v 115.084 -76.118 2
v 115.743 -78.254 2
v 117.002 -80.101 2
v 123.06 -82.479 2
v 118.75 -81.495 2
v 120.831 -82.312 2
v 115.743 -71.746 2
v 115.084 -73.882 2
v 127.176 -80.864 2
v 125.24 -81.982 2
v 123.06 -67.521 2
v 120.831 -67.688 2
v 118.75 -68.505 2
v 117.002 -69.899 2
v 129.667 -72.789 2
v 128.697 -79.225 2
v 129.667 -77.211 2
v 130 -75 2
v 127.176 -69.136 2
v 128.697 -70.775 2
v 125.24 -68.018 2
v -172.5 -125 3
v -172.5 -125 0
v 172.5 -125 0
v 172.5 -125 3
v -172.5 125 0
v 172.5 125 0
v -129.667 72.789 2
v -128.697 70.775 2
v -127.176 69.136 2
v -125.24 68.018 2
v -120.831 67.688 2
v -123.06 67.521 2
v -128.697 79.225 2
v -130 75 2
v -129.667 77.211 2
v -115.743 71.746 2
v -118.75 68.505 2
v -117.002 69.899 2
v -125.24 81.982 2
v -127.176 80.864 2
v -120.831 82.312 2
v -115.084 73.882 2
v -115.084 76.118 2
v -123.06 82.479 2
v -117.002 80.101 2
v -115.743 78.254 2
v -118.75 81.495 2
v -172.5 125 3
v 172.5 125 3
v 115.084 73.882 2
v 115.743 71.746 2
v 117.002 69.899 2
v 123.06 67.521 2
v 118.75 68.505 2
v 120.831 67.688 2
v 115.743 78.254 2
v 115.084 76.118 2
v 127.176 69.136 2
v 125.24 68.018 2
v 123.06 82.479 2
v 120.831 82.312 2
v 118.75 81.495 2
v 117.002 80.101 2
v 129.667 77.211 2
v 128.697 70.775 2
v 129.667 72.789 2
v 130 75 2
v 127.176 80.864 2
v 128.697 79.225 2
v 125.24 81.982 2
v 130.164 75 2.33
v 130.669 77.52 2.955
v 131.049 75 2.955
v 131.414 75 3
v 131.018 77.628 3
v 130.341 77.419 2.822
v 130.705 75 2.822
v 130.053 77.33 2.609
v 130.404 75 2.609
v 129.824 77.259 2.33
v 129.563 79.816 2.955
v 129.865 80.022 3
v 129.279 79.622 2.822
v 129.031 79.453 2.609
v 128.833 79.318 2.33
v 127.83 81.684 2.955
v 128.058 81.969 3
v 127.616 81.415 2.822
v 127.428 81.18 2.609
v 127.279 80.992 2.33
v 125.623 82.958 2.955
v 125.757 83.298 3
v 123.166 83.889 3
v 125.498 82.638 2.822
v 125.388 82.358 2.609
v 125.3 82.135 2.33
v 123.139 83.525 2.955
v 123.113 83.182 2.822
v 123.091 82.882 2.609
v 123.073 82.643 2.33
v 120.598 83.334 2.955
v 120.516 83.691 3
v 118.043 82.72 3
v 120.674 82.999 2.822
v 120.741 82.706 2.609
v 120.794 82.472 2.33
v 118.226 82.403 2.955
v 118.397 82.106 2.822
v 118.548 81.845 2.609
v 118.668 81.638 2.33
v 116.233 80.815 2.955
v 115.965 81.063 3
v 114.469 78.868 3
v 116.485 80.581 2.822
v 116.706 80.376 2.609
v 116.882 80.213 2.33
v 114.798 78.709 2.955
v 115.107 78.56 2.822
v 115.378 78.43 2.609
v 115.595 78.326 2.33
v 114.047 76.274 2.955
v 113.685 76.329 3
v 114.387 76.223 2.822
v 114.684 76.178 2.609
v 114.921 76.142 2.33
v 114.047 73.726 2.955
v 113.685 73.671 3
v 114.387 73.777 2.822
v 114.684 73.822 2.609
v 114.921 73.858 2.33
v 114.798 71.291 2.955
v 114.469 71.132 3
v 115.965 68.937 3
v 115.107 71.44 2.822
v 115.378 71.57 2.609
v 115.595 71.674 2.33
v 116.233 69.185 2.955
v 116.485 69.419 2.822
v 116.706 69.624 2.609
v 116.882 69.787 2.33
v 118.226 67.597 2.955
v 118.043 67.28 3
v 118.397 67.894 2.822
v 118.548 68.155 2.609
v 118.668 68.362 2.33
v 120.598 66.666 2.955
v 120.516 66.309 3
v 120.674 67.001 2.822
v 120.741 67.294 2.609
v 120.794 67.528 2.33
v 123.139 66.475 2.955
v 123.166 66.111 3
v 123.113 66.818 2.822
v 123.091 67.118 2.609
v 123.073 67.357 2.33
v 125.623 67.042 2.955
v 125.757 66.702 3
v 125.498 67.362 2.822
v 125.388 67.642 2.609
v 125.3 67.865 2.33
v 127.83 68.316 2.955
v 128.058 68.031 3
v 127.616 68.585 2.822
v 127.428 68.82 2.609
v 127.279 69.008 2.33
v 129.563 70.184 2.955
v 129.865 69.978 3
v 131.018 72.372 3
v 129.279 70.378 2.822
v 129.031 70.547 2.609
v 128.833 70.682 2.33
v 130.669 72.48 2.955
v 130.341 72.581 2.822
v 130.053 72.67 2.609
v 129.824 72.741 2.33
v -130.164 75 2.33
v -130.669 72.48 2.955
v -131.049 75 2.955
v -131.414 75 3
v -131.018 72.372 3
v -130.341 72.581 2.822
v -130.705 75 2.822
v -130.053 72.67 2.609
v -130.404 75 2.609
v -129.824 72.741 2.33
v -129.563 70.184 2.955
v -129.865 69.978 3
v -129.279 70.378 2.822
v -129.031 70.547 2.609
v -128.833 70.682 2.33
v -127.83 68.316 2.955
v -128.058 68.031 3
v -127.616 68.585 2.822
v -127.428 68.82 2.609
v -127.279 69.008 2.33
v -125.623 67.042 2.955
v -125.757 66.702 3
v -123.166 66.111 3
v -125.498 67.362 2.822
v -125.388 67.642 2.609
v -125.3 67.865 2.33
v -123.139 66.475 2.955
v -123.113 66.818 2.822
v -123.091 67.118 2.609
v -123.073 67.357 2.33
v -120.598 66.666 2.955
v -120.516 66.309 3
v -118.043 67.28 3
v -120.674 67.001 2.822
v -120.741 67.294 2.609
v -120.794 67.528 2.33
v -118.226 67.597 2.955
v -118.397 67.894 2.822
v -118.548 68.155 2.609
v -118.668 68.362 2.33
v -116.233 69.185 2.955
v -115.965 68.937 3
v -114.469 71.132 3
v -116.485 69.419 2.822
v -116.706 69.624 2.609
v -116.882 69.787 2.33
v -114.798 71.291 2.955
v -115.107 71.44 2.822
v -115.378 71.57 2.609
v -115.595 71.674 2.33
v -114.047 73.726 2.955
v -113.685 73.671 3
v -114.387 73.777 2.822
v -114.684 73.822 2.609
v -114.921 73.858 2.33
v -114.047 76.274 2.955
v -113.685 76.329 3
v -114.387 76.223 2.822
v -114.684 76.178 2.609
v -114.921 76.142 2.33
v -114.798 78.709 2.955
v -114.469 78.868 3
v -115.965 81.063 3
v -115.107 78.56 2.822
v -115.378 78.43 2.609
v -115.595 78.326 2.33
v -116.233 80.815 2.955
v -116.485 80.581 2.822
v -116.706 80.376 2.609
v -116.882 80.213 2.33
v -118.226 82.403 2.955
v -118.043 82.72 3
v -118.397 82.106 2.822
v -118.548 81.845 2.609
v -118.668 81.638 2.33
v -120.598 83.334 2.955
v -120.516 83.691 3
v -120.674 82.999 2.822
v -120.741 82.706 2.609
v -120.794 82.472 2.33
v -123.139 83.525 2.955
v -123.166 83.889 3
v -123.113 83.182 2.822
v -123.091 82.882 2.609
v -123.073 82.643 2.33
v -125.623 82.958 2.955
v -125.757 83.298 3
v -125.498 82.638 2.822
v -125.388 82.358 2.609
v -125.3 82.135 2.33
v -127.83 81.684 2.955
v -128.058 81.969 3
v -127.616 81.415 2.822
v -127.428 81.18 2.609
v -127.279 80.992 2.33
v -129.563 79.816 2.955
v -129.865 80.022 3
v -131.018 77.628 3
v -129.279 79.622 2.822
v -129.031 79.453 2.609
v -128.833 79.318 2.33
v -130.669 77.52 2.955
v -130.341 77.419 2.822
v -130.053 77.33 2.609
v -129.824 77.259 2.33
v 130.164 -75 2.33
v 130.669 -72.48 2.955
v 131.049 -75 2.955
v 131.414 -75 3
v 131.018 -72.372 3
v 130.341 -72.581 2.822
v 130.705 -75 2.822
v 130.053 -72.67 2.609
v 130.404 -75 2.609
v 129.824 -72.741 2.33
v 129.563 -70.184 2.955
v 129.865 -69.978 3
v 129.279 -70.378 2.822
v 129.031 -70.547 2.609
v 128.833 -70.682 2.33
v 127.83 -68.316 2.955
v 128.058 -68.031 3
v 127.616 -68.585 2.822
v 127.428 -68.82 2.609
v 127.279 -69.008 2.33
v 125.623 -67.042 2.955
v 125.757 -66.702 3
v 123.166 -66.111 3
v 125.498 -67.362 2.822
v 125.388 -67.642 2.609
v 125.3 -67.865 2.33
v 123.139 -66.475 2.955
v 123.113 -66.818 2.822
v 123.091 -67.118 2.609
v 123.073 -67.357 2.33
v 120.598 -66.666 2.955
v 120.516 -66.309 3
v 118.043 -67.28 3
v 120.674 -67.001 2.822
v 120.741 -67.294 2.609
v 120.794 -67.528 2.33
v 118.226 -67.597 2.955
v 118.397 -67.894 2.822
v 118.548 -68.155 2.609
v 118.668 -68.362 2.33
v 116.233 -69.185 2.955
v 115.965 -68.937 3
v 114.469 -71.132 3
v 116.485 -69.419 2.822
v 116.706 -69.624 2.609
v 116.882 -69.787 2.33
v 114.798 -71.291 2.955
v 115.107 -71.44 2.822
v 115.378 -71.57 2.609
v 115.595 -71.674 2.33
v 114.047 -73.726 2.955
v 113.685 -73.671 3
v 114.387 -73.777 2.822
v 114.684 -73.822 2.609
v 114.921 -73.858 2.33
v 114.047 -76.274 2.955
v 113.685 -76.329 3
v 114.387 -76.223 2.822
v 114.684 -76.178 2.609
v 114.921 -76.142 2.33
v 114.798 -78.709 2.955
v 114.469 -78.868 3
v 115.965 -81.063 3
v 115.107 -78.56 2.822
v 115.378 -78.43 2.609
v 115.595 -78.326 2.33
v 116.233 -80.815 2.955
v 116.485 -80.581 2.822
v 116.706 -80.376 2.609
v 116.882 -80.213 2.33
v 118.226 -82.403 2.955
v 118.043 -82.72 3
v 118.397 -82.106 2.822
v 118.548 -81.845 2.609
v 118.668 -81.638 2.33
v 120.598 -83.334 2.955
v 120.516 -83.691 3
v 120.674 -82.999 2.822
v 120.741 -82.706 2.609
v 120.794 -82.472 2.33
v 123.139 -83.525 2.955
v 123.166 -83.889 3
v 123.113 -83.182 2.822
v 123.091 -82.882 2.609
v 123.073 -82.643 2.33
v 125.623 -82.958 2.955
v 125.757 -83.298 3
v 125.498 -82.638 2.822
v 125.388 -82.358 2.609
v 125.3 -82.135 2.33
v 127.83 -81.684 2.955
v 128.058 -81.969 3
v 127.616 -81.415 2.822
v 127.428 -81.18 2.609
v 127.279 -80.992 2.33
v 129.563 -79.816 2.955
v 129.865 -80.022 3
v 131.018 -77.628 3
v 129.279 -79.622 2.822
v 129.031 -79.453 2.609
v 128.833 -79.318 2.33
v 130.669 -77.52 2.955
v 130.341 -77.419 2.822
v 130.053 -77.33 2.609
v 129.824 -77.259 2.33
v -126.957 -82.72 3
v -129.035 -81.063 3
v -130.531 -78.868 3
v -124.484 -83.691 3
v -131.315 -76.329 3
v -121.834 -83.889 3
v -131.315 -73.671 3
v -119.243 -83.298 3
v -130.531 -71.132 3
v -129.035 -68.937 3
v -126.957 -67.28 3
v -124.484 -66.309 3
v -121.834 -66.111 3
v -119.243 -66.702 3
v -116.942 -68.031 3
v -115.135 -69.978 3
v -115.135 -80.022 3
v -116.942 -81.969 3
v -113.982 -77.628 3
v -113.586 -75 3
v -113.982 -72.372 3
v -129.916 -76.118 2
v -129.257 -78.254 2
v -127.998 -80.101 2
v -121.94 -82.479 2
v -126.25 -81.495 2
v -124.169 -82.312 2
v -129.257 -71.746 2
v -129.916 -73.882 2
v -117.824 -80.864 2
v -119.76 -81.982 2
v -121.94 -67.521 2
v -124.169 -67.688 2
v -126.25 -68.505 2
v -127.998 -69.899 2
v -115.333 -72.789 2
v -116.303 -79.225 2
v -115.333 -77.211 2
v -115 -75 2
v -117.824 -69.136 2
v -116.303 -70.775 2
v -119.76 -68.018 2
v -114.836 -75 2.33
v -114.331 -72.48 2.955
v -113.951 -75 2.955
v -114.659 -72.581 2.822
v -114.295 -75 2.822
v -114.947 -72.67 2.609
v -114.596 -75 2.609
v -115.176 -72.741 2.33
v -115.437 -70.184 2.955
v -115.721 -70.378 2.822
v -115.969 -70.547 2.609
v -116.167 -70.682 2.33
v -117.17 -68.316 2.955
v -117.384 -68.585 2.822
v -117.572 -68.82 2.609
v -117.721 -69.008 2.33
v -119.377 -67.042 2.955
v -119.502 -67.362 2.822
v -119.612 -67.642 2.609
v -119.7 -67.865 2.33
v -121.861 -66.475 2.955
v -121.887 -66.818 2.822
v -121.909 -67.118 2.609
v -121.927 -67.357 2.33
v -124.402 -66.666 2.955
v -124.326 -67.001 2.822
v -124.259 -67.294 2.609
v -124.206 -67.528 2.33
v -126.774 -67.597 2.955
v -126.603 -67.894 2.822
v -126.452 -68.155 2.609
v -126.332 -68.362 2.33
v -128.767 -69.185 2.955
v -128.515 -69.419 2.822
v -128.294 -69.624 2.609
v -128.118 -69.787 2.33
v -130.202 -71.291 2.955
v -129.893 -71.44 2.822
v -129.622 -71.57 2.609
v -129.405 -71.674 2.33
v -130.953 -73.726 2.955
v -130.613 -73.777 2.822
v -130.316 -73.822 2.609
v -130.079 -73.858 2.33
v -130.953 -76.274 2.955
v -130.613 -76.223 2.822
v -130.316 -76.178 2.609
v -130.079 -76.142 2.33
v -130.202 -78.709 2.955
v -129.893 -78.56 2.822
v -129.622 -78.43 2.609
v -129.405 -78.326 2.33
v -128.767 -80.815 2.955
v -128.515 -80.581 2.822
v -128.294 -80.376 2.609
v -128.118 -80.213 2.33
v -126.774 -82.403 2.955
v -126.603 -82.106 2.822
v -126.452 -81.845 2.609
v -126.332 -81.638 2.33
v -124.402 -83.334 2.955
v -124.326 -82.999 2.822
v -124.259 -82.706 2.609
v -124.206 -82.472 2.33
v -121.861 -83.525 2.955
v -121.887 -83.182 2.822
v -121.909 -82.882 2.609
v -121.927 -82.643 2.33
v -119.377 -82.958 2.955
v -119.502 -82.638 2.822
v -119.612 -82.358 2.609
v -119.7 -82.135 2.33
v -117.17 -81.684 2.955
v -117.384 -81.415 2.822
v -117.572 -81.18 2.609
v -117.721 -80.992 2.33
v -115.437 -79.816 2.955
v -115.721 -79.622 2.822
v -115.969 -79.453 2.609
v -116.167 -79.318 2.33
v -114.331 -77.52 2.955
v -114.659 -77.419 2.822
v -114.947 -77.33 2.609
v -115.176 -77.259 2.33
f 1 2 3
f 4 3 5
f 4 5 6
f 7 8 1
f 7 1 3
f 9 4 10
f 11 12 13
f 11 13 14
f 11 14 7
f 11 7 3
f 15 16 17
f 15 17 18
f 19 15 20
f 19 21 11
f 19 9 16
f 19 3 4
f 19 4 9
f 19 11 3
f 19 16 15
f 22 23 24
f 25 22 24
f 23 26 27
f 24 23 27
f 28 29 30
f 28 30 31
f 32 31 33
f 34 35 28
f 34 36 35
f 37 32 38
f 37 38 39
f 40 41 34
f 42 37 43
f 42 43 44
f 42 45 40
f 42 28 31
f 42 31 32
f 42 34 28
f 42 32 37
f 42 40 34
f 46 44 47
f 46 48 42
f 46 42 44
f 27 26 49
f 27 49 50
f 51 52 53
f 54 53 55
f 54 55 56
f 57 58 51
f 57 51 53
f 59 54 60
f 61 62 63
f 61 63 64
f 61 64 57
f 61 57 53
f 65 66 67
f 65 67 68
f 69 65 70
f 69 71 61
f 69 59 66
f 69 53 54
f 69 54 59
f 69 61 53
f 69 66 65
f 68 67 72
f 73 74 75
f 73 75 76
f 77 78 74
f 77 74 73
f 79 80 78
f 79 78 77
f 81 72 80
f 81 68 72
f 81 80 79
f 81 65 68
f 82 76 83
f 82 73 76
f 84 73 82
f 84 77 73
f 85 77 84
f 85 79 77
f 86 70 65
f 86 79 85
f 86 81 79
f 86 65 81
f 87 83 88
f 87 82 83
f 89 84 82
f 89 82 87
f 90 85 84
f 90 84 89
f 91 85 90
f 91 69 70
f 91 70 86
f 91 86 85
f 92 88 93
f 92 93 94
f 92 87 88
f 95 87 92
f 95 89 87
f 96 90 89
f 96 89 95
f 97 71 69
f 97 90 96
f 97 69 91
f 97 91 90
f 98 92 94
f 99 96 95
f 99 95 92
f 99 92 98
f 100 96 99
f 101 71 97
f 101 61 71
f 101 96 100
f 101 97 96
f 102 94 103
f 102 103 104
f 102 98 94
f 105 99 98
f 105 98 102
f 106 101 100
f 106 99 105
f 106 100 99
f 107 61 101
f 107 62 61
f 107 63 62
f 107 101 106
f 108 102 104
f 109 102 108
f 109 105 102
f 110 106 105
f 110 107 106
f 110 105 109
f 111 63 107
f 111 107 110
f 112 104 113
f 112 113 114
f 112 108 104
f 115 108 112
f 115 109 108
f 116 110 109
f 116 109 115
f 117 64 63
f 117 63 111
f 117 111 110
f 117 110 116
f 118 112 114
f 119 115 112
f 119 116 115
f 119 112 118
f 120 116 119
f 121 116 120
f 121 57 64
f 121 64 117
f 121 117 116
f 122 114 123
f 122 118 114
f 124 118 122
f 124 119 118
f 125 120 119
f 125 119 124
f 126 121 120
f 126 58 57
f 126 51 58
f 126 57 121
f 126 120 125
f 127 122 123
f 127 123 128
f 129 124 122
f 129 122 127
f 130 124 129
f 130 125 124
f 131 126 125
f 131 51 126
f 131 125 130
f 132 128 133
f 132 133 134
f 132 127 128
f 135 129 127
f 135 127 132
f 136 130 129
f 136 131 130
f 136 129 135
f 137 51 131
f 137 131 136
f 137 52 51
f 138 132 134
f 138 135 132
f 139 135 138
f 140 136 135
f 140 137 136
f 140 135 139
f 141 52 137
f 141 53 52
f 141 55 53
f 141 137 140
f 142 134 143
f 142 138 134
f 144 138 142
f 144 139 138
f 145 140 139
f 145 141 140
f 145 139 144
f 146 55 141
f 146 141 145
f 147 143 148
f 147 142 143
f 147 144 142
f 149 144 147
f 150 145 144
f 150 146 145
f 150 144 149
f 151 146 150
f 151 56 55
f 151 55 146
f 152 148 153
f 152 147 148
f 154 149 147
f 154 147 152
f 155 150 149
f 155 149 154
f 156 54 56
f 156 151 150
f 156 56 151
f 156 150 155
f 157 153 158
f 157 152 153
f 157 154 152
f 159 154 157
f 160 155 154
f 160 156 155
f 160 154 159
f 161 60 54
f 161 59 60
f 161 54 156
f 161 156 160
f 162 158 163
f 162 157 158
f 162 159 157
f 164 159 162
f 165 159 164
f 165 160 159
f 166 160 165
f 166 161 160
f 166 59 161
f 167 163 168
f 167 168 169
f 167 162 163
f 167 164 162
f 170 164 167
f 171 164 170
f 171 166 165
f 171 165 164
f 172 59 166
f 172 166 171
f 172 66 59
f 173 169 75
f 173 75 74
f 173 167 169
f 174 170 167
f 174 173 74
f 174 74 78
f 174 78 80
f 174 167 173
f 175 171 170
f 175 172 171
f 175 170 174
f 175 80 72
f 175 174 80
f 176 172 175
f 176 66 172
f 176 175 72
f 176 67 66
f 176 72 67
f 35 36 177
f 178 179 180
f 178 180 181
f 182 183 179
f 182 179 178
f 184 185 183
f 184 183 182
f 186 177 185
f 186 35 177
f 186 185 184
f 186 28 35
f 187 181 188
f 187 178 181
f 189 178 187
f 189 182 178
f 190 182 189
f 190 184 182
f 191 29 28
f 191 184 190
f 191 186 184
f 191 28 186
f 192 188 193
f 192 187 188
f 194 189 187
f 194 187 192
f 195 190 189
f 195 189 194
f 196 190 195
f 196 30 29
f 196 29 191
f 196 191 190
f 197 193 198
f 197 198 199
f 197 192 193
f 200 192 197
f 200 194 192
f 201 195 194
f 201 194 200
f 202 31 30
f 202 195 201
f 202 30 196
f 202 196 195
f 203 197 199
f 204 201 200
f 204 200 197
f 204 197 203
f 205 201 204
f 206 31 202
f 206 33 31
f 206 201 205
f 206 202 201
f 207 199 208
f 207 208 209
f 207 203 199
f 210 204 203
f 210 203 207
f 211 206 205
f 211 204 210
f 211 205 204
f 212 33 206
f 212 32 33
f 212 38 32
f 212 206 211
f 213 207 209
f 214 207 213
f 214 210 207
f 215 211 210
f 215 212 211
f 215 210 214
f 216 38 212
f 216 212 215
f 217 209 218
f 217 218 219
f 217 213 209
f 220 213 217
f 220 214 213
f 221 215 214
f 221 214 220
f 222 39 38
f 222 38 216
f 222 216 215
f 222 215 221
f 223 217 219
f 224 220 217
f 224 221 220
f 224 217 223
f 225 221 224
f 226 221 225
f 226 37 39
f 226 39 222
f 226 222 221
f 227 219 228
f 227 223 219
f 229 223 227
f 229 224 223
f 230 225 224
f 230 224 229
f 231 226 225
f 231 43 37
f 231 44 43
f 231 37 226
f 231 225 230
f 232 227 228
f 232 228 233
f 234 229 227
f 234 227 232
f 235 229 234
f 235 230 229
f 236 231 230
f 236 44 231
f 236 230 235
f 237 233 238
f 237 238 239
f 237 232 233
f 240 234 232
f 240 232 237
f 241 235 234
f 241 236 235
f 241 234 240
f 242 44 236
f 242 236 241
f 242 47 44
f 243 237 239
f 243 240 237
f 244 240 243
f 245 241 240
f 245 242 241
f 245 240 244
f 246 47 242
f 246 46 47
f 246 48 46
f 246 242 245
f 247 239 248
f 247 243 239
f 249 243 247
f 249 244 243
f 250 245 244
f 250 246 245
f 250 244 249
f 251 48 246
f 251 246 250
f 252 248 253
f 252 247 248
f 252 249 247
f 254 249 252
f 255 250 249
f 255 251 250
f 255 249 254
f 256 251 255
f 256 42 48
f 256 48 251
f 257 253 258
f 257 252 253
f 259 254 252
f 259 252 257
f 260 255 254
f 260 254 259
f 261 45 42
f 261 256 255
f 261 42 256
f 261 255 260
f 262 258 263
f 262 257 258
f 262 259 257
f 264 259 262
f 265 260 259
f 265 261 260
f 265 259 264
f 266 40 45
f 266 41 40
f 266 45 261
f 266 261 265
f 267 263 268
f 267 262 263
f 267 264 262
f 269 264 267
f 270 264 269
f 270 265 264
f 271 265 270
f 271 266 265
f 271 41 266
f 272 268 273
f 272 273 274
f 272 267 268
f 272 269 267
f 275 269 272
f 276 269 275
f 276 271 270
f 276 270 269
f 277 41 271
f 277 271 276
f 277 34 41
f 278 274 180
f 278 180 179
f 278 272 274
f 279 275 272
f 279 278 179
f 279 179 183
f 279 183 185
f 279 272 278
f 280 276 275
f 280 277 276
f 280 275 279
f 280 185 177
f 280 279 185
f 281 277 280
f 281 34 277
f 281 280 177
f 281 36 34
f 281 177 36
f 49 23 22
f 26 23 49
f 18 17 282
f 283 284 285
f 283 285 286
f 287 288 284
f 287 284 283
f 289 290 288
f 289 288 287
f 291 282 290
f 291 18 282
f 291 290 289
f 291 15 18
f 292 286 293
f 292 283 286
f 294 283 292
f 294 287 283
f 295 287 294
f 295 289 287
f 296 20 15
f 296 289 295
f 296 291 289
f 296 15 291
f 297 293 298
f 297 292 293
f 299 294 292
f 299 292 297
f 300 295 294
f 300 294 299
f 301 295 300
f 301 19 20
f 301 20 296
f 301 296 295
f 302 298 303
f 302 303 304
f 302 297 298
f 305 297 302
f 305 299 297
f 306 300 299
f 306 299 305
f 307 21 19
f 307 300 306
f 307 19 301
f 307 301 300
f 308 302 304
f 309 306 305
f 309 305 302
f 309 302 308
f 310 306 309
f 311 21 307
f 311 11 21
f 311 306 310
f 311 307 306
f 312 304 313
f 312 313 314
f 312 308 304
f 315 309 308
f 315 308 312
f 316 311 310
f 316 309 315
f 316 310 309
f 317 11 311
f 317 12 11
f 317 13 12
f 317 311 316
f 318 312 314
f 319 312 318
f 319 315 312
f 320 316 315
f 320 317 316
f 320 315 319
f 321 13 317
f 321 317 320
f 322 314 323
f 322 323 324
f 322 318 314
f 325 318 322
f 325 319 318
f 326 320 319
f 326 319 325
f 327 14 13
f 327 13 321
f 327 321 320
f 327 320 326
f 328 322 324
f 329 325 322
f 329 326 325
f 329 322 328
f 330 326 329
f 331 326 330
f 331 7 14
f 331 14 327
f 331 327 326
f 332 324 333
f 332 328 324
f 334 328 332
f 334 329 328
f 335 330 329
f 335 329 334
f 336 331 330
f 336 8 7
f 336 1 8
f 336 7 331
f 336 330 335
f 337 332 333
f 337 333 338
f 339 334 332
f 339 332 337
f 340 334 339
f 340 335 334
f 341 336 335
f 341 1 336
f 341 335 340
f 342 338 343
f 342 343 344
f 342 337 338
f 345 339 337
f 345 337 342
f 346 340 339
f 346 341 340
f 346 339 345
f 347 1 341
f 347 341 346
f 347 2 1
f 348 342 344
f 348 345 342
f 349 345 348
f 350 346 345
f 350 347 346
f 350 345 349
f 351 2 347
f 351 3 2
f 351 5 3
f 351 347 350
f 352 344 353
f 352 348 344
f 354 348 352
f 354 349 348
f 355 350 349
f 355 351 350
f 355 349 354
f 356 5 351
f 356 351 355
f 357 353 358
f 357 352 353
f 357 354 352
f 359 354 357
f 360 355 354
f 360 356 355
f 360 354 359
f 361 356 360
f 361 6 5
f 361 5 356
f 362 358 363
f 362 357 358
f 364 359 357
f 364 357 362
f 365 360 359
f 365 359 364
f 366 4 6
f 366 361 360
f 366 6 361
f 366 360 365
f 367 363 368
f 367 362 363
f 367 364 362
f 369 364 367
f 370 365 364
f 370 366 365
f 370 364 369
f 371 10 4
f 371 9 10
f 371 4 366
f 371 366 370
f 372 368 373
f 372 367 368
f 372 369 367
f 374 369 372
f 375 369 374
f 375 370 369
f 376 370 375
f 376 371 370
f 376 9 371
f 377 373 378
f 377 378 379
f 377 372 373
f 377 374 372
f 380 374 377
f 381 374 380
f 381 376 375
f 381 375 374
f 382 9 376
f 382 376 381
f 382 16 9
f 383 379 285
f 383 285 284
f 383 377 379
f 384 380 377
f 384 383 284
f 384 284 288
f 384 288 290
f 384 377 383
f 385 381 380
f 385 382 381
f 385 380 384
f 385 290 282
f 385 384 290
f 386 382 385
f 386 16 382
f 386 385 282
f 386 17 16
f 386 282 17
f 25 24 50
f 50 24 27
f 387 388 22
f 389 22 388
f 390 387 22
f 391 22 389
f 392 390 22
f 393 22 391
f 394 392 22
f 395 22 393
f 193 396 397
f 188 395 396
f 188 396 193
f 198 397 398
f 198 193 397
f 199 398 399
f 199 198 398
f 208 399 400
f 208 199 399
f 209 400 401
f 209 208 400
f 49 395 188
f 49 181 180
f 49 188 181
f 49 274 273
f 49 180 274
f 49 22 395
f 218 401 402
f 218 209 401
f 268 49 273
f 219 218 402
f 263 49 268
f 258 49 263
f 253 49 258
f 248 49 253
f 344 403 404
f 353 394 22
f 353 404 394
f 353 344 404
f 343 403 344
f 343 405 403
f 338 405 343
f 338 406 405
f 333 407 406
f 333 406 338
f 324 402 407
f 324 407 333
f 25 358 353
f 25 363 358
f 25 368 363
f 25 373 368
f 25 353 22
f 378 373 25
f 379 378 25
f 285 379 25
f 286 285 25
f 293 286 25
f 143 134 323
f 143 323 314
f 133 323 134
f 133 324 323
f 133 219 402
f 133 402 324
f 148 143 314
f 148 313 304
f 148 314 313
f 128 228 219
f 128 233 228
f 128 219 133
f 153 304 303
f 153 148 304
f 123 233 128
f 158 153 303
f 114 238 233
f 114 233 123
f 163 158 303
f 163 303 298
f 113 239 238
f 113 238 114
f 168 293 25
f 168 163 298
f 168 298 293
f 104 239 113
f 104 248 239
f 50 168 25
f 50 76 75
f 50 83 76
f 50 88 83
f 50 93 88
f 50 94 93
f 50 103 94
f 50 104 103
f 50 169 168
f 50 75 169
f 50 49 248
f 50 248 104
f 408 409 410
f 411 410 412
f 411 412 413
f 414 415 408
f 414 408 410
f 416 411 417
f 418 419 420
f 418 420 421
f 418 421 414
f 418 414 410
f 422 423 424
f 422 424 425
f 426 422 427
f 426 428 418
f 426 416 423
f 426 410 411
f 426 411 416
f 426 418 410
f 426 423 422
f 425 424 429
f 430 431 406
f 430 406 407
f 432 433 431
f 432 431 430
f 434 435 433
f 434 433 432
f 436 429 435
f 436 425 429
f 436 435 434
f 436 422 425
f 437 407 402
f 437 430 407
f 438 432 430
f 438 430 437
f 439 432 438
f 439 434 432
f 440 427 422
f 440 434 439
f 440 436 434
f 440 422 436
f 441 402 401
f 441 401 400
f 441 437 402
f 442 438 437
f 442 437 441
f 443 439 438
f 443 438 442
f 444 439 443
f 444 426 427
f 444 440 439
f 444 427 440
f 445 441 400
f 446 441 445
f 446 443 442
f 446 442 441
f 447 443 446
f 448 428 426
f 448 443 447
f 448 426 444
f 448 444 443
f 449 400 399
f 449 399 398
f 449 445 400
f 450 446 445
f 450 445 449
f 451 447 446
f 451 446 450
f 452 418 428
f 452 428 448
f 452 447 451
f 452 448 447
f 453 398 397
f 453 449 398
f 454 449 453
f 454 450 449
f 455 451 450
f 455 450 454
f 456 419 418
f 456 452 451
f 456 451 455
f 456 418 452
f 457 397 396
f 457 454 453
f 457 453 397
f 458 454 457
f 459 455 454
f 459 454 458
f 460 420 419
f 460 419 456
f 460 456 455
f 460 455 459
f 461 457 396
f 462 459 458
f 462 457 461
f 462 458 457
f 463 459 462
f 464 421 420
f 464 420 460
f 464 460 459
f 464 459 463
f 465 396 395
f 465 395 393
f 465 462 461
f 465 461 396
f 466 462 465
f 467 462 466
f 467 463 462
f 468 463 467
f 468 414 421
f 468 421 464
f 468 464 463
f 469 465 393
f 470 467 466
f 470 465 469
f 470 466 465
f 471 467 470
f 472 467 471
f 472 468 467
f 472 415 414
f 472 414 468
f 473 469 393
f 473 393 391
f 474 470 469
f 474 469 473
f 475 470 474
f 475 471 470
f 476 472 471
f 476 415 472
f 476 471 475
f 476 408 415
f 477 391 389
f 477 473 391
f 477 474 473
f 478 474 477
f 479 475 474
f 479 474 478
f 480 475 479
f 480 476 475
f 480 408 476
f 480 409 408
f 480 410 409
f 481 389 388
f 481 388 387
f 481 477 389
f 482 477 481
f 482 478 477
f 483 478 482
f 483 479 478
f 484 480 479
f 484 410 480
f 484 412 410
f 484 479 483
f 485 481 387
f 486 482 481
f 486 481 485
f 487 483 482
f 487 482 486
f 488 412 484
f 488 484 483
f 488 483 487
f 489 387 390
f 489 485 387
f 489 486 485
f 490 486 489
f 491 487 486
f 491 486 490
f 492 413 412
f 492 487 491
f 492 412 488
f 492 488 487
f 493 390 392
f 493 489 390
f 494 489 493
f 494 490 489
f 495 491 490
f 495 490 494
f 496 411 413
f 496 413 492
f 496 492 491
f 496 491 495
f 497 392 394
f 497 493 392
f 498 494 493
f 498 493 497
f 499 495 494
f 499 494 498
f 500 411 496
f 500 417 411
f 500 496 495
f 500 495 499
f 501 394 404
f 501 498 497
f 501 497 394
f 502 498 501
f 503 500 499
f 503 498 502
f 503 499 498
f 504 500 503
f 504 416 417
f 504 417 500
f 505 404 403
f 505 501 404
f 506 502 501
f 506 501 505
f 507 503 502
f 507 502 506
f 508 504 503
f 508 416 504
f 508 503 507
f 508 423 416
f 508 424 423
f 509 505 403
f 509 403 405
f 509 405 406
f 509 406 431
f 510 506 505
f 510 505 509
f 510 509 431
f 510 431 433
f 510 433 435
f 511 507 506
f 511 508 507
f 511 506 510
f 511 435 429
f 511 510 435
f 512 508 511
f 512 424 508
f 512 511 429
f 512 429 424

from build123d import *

# Parameters (mm, degrees)
F0_W     = 345
F0_H     = 250
F1_DEPTH = 3
F2_R     = 7.5
F3_DEPTH = 1


# Not quite as in the source:
# - a fillet or chamfer that OpenCascade refuses, or shapes differently, is made with other operations: its cross-section is extruded or revolved along the edge and cut away or added


with BuildPart() as f1:
    # F0 (on Top) → F1 (new body)
    with BuildSketch(Plane.XY):
        Rectangle(F0_W, F0_H)
    extrude(amount=F1_DEPTH)

    # F2 (on face) → F3 (cut)
    with BuildSketch(Plane.XY.offset(3)):
        with BuildLine():
            Line((-122.5, 75), (-122.5, 82.5))
            ThreePointArc((-122.5, 82.5), (-127.8033008589, 80.3033008589), (-130, 75))
            Line((-130, 75), (-122.5, 75))
        make_face()
        with BuildLine():
            ThreePointArc((-115, 75), (-117.1966991411, 80.3033008589), (-122.5, 82.5))
            Line((-122.5, 82.5), (-122.5, 75))
            Line((-122.5, 75), (-130, 75))
            ThreePointArc((-130, 75), (-122.5, 67.5), (-115, 75))
        make_face()
        with Locations((122.5, 75)):
            Circle(F2_R)
        with Locations((122.5, -75)):
            Circle(F2_R)
        with Locations((-122.5, -75)):
            Circle(F2_R)
    extrude(amount=-F3_DEPTH, mode=Mode.SUBTRACT)

    # F4: fillet of radius 1.5 on 4 edges, made by hand

    # F4_s1 → F4_t2 (revolve, cut)
    with BuildSketch(Plane.XZ.offset(-75)):
        with BuildLine():
            ThreePointArc((-131.4142135624, 3), (-130.5481881586, 2.7247448714), (-130, 2))
            Line((-130, 2), (-130, 3))
            Line((-130, 3), (-131.4142135624, 3))
        make_face()
    revolve(axis=Axis((-122.5, 75, 3), (0, 0, 1)), mode=Mode.SUBTRACT)

    # F4_s3 → F4_t4 (revolve, cut)
    with BuildSketch(Plane.XZ.offset(75)):
        with BuildLine():
            ThreePointArc((-113.5857864376, 3), (-114.4518118414, 2.7247448714), (-115, 2))
            Line((-115, 2), (-115, 3))
            Line((-115, 3), (-113.5857864376, 3))
        make_face()
    revolve(axis=Axis((-122.5, -75, 3), (0, 0, 1)), mode=Mode.SUBTRACT)

    # F4_s5 → F4_t6 (revolve, cut)
    with BuildSketch(Plane.XZ.offset(75)):
        with BuildLine():
            ThreePointArc((131.4142135624, 3), (130.5481881586, 2.7247448714), (130, 2))
            Line((130, 2), (130, 3))
            Line((130, 3), (131.4142135624, 3))
        make_face()
    revolve(axis=Axis((122.5, -75, 3), (0, 0, 1)), mode=Mode.SUBTRACT)

    # F4_s7 → F4_t8 (revolve, cut)
    with BuildSketch(Plane.XZ.offset(-75)):
        with BuildLine():
            ThreePointArc((131.4142135624, 3), (130.5481881586, 2.7247448714), (130, 2))
            Line((130, 2), (130, 3))
            Line((130, 3), (131.4142135624, 3))
        make_face()
    revolve(axis=Axis((122.5, 75, 3), (0, 0, 1)), mode=Mode.SUBTRACT)


solid = f1.part
